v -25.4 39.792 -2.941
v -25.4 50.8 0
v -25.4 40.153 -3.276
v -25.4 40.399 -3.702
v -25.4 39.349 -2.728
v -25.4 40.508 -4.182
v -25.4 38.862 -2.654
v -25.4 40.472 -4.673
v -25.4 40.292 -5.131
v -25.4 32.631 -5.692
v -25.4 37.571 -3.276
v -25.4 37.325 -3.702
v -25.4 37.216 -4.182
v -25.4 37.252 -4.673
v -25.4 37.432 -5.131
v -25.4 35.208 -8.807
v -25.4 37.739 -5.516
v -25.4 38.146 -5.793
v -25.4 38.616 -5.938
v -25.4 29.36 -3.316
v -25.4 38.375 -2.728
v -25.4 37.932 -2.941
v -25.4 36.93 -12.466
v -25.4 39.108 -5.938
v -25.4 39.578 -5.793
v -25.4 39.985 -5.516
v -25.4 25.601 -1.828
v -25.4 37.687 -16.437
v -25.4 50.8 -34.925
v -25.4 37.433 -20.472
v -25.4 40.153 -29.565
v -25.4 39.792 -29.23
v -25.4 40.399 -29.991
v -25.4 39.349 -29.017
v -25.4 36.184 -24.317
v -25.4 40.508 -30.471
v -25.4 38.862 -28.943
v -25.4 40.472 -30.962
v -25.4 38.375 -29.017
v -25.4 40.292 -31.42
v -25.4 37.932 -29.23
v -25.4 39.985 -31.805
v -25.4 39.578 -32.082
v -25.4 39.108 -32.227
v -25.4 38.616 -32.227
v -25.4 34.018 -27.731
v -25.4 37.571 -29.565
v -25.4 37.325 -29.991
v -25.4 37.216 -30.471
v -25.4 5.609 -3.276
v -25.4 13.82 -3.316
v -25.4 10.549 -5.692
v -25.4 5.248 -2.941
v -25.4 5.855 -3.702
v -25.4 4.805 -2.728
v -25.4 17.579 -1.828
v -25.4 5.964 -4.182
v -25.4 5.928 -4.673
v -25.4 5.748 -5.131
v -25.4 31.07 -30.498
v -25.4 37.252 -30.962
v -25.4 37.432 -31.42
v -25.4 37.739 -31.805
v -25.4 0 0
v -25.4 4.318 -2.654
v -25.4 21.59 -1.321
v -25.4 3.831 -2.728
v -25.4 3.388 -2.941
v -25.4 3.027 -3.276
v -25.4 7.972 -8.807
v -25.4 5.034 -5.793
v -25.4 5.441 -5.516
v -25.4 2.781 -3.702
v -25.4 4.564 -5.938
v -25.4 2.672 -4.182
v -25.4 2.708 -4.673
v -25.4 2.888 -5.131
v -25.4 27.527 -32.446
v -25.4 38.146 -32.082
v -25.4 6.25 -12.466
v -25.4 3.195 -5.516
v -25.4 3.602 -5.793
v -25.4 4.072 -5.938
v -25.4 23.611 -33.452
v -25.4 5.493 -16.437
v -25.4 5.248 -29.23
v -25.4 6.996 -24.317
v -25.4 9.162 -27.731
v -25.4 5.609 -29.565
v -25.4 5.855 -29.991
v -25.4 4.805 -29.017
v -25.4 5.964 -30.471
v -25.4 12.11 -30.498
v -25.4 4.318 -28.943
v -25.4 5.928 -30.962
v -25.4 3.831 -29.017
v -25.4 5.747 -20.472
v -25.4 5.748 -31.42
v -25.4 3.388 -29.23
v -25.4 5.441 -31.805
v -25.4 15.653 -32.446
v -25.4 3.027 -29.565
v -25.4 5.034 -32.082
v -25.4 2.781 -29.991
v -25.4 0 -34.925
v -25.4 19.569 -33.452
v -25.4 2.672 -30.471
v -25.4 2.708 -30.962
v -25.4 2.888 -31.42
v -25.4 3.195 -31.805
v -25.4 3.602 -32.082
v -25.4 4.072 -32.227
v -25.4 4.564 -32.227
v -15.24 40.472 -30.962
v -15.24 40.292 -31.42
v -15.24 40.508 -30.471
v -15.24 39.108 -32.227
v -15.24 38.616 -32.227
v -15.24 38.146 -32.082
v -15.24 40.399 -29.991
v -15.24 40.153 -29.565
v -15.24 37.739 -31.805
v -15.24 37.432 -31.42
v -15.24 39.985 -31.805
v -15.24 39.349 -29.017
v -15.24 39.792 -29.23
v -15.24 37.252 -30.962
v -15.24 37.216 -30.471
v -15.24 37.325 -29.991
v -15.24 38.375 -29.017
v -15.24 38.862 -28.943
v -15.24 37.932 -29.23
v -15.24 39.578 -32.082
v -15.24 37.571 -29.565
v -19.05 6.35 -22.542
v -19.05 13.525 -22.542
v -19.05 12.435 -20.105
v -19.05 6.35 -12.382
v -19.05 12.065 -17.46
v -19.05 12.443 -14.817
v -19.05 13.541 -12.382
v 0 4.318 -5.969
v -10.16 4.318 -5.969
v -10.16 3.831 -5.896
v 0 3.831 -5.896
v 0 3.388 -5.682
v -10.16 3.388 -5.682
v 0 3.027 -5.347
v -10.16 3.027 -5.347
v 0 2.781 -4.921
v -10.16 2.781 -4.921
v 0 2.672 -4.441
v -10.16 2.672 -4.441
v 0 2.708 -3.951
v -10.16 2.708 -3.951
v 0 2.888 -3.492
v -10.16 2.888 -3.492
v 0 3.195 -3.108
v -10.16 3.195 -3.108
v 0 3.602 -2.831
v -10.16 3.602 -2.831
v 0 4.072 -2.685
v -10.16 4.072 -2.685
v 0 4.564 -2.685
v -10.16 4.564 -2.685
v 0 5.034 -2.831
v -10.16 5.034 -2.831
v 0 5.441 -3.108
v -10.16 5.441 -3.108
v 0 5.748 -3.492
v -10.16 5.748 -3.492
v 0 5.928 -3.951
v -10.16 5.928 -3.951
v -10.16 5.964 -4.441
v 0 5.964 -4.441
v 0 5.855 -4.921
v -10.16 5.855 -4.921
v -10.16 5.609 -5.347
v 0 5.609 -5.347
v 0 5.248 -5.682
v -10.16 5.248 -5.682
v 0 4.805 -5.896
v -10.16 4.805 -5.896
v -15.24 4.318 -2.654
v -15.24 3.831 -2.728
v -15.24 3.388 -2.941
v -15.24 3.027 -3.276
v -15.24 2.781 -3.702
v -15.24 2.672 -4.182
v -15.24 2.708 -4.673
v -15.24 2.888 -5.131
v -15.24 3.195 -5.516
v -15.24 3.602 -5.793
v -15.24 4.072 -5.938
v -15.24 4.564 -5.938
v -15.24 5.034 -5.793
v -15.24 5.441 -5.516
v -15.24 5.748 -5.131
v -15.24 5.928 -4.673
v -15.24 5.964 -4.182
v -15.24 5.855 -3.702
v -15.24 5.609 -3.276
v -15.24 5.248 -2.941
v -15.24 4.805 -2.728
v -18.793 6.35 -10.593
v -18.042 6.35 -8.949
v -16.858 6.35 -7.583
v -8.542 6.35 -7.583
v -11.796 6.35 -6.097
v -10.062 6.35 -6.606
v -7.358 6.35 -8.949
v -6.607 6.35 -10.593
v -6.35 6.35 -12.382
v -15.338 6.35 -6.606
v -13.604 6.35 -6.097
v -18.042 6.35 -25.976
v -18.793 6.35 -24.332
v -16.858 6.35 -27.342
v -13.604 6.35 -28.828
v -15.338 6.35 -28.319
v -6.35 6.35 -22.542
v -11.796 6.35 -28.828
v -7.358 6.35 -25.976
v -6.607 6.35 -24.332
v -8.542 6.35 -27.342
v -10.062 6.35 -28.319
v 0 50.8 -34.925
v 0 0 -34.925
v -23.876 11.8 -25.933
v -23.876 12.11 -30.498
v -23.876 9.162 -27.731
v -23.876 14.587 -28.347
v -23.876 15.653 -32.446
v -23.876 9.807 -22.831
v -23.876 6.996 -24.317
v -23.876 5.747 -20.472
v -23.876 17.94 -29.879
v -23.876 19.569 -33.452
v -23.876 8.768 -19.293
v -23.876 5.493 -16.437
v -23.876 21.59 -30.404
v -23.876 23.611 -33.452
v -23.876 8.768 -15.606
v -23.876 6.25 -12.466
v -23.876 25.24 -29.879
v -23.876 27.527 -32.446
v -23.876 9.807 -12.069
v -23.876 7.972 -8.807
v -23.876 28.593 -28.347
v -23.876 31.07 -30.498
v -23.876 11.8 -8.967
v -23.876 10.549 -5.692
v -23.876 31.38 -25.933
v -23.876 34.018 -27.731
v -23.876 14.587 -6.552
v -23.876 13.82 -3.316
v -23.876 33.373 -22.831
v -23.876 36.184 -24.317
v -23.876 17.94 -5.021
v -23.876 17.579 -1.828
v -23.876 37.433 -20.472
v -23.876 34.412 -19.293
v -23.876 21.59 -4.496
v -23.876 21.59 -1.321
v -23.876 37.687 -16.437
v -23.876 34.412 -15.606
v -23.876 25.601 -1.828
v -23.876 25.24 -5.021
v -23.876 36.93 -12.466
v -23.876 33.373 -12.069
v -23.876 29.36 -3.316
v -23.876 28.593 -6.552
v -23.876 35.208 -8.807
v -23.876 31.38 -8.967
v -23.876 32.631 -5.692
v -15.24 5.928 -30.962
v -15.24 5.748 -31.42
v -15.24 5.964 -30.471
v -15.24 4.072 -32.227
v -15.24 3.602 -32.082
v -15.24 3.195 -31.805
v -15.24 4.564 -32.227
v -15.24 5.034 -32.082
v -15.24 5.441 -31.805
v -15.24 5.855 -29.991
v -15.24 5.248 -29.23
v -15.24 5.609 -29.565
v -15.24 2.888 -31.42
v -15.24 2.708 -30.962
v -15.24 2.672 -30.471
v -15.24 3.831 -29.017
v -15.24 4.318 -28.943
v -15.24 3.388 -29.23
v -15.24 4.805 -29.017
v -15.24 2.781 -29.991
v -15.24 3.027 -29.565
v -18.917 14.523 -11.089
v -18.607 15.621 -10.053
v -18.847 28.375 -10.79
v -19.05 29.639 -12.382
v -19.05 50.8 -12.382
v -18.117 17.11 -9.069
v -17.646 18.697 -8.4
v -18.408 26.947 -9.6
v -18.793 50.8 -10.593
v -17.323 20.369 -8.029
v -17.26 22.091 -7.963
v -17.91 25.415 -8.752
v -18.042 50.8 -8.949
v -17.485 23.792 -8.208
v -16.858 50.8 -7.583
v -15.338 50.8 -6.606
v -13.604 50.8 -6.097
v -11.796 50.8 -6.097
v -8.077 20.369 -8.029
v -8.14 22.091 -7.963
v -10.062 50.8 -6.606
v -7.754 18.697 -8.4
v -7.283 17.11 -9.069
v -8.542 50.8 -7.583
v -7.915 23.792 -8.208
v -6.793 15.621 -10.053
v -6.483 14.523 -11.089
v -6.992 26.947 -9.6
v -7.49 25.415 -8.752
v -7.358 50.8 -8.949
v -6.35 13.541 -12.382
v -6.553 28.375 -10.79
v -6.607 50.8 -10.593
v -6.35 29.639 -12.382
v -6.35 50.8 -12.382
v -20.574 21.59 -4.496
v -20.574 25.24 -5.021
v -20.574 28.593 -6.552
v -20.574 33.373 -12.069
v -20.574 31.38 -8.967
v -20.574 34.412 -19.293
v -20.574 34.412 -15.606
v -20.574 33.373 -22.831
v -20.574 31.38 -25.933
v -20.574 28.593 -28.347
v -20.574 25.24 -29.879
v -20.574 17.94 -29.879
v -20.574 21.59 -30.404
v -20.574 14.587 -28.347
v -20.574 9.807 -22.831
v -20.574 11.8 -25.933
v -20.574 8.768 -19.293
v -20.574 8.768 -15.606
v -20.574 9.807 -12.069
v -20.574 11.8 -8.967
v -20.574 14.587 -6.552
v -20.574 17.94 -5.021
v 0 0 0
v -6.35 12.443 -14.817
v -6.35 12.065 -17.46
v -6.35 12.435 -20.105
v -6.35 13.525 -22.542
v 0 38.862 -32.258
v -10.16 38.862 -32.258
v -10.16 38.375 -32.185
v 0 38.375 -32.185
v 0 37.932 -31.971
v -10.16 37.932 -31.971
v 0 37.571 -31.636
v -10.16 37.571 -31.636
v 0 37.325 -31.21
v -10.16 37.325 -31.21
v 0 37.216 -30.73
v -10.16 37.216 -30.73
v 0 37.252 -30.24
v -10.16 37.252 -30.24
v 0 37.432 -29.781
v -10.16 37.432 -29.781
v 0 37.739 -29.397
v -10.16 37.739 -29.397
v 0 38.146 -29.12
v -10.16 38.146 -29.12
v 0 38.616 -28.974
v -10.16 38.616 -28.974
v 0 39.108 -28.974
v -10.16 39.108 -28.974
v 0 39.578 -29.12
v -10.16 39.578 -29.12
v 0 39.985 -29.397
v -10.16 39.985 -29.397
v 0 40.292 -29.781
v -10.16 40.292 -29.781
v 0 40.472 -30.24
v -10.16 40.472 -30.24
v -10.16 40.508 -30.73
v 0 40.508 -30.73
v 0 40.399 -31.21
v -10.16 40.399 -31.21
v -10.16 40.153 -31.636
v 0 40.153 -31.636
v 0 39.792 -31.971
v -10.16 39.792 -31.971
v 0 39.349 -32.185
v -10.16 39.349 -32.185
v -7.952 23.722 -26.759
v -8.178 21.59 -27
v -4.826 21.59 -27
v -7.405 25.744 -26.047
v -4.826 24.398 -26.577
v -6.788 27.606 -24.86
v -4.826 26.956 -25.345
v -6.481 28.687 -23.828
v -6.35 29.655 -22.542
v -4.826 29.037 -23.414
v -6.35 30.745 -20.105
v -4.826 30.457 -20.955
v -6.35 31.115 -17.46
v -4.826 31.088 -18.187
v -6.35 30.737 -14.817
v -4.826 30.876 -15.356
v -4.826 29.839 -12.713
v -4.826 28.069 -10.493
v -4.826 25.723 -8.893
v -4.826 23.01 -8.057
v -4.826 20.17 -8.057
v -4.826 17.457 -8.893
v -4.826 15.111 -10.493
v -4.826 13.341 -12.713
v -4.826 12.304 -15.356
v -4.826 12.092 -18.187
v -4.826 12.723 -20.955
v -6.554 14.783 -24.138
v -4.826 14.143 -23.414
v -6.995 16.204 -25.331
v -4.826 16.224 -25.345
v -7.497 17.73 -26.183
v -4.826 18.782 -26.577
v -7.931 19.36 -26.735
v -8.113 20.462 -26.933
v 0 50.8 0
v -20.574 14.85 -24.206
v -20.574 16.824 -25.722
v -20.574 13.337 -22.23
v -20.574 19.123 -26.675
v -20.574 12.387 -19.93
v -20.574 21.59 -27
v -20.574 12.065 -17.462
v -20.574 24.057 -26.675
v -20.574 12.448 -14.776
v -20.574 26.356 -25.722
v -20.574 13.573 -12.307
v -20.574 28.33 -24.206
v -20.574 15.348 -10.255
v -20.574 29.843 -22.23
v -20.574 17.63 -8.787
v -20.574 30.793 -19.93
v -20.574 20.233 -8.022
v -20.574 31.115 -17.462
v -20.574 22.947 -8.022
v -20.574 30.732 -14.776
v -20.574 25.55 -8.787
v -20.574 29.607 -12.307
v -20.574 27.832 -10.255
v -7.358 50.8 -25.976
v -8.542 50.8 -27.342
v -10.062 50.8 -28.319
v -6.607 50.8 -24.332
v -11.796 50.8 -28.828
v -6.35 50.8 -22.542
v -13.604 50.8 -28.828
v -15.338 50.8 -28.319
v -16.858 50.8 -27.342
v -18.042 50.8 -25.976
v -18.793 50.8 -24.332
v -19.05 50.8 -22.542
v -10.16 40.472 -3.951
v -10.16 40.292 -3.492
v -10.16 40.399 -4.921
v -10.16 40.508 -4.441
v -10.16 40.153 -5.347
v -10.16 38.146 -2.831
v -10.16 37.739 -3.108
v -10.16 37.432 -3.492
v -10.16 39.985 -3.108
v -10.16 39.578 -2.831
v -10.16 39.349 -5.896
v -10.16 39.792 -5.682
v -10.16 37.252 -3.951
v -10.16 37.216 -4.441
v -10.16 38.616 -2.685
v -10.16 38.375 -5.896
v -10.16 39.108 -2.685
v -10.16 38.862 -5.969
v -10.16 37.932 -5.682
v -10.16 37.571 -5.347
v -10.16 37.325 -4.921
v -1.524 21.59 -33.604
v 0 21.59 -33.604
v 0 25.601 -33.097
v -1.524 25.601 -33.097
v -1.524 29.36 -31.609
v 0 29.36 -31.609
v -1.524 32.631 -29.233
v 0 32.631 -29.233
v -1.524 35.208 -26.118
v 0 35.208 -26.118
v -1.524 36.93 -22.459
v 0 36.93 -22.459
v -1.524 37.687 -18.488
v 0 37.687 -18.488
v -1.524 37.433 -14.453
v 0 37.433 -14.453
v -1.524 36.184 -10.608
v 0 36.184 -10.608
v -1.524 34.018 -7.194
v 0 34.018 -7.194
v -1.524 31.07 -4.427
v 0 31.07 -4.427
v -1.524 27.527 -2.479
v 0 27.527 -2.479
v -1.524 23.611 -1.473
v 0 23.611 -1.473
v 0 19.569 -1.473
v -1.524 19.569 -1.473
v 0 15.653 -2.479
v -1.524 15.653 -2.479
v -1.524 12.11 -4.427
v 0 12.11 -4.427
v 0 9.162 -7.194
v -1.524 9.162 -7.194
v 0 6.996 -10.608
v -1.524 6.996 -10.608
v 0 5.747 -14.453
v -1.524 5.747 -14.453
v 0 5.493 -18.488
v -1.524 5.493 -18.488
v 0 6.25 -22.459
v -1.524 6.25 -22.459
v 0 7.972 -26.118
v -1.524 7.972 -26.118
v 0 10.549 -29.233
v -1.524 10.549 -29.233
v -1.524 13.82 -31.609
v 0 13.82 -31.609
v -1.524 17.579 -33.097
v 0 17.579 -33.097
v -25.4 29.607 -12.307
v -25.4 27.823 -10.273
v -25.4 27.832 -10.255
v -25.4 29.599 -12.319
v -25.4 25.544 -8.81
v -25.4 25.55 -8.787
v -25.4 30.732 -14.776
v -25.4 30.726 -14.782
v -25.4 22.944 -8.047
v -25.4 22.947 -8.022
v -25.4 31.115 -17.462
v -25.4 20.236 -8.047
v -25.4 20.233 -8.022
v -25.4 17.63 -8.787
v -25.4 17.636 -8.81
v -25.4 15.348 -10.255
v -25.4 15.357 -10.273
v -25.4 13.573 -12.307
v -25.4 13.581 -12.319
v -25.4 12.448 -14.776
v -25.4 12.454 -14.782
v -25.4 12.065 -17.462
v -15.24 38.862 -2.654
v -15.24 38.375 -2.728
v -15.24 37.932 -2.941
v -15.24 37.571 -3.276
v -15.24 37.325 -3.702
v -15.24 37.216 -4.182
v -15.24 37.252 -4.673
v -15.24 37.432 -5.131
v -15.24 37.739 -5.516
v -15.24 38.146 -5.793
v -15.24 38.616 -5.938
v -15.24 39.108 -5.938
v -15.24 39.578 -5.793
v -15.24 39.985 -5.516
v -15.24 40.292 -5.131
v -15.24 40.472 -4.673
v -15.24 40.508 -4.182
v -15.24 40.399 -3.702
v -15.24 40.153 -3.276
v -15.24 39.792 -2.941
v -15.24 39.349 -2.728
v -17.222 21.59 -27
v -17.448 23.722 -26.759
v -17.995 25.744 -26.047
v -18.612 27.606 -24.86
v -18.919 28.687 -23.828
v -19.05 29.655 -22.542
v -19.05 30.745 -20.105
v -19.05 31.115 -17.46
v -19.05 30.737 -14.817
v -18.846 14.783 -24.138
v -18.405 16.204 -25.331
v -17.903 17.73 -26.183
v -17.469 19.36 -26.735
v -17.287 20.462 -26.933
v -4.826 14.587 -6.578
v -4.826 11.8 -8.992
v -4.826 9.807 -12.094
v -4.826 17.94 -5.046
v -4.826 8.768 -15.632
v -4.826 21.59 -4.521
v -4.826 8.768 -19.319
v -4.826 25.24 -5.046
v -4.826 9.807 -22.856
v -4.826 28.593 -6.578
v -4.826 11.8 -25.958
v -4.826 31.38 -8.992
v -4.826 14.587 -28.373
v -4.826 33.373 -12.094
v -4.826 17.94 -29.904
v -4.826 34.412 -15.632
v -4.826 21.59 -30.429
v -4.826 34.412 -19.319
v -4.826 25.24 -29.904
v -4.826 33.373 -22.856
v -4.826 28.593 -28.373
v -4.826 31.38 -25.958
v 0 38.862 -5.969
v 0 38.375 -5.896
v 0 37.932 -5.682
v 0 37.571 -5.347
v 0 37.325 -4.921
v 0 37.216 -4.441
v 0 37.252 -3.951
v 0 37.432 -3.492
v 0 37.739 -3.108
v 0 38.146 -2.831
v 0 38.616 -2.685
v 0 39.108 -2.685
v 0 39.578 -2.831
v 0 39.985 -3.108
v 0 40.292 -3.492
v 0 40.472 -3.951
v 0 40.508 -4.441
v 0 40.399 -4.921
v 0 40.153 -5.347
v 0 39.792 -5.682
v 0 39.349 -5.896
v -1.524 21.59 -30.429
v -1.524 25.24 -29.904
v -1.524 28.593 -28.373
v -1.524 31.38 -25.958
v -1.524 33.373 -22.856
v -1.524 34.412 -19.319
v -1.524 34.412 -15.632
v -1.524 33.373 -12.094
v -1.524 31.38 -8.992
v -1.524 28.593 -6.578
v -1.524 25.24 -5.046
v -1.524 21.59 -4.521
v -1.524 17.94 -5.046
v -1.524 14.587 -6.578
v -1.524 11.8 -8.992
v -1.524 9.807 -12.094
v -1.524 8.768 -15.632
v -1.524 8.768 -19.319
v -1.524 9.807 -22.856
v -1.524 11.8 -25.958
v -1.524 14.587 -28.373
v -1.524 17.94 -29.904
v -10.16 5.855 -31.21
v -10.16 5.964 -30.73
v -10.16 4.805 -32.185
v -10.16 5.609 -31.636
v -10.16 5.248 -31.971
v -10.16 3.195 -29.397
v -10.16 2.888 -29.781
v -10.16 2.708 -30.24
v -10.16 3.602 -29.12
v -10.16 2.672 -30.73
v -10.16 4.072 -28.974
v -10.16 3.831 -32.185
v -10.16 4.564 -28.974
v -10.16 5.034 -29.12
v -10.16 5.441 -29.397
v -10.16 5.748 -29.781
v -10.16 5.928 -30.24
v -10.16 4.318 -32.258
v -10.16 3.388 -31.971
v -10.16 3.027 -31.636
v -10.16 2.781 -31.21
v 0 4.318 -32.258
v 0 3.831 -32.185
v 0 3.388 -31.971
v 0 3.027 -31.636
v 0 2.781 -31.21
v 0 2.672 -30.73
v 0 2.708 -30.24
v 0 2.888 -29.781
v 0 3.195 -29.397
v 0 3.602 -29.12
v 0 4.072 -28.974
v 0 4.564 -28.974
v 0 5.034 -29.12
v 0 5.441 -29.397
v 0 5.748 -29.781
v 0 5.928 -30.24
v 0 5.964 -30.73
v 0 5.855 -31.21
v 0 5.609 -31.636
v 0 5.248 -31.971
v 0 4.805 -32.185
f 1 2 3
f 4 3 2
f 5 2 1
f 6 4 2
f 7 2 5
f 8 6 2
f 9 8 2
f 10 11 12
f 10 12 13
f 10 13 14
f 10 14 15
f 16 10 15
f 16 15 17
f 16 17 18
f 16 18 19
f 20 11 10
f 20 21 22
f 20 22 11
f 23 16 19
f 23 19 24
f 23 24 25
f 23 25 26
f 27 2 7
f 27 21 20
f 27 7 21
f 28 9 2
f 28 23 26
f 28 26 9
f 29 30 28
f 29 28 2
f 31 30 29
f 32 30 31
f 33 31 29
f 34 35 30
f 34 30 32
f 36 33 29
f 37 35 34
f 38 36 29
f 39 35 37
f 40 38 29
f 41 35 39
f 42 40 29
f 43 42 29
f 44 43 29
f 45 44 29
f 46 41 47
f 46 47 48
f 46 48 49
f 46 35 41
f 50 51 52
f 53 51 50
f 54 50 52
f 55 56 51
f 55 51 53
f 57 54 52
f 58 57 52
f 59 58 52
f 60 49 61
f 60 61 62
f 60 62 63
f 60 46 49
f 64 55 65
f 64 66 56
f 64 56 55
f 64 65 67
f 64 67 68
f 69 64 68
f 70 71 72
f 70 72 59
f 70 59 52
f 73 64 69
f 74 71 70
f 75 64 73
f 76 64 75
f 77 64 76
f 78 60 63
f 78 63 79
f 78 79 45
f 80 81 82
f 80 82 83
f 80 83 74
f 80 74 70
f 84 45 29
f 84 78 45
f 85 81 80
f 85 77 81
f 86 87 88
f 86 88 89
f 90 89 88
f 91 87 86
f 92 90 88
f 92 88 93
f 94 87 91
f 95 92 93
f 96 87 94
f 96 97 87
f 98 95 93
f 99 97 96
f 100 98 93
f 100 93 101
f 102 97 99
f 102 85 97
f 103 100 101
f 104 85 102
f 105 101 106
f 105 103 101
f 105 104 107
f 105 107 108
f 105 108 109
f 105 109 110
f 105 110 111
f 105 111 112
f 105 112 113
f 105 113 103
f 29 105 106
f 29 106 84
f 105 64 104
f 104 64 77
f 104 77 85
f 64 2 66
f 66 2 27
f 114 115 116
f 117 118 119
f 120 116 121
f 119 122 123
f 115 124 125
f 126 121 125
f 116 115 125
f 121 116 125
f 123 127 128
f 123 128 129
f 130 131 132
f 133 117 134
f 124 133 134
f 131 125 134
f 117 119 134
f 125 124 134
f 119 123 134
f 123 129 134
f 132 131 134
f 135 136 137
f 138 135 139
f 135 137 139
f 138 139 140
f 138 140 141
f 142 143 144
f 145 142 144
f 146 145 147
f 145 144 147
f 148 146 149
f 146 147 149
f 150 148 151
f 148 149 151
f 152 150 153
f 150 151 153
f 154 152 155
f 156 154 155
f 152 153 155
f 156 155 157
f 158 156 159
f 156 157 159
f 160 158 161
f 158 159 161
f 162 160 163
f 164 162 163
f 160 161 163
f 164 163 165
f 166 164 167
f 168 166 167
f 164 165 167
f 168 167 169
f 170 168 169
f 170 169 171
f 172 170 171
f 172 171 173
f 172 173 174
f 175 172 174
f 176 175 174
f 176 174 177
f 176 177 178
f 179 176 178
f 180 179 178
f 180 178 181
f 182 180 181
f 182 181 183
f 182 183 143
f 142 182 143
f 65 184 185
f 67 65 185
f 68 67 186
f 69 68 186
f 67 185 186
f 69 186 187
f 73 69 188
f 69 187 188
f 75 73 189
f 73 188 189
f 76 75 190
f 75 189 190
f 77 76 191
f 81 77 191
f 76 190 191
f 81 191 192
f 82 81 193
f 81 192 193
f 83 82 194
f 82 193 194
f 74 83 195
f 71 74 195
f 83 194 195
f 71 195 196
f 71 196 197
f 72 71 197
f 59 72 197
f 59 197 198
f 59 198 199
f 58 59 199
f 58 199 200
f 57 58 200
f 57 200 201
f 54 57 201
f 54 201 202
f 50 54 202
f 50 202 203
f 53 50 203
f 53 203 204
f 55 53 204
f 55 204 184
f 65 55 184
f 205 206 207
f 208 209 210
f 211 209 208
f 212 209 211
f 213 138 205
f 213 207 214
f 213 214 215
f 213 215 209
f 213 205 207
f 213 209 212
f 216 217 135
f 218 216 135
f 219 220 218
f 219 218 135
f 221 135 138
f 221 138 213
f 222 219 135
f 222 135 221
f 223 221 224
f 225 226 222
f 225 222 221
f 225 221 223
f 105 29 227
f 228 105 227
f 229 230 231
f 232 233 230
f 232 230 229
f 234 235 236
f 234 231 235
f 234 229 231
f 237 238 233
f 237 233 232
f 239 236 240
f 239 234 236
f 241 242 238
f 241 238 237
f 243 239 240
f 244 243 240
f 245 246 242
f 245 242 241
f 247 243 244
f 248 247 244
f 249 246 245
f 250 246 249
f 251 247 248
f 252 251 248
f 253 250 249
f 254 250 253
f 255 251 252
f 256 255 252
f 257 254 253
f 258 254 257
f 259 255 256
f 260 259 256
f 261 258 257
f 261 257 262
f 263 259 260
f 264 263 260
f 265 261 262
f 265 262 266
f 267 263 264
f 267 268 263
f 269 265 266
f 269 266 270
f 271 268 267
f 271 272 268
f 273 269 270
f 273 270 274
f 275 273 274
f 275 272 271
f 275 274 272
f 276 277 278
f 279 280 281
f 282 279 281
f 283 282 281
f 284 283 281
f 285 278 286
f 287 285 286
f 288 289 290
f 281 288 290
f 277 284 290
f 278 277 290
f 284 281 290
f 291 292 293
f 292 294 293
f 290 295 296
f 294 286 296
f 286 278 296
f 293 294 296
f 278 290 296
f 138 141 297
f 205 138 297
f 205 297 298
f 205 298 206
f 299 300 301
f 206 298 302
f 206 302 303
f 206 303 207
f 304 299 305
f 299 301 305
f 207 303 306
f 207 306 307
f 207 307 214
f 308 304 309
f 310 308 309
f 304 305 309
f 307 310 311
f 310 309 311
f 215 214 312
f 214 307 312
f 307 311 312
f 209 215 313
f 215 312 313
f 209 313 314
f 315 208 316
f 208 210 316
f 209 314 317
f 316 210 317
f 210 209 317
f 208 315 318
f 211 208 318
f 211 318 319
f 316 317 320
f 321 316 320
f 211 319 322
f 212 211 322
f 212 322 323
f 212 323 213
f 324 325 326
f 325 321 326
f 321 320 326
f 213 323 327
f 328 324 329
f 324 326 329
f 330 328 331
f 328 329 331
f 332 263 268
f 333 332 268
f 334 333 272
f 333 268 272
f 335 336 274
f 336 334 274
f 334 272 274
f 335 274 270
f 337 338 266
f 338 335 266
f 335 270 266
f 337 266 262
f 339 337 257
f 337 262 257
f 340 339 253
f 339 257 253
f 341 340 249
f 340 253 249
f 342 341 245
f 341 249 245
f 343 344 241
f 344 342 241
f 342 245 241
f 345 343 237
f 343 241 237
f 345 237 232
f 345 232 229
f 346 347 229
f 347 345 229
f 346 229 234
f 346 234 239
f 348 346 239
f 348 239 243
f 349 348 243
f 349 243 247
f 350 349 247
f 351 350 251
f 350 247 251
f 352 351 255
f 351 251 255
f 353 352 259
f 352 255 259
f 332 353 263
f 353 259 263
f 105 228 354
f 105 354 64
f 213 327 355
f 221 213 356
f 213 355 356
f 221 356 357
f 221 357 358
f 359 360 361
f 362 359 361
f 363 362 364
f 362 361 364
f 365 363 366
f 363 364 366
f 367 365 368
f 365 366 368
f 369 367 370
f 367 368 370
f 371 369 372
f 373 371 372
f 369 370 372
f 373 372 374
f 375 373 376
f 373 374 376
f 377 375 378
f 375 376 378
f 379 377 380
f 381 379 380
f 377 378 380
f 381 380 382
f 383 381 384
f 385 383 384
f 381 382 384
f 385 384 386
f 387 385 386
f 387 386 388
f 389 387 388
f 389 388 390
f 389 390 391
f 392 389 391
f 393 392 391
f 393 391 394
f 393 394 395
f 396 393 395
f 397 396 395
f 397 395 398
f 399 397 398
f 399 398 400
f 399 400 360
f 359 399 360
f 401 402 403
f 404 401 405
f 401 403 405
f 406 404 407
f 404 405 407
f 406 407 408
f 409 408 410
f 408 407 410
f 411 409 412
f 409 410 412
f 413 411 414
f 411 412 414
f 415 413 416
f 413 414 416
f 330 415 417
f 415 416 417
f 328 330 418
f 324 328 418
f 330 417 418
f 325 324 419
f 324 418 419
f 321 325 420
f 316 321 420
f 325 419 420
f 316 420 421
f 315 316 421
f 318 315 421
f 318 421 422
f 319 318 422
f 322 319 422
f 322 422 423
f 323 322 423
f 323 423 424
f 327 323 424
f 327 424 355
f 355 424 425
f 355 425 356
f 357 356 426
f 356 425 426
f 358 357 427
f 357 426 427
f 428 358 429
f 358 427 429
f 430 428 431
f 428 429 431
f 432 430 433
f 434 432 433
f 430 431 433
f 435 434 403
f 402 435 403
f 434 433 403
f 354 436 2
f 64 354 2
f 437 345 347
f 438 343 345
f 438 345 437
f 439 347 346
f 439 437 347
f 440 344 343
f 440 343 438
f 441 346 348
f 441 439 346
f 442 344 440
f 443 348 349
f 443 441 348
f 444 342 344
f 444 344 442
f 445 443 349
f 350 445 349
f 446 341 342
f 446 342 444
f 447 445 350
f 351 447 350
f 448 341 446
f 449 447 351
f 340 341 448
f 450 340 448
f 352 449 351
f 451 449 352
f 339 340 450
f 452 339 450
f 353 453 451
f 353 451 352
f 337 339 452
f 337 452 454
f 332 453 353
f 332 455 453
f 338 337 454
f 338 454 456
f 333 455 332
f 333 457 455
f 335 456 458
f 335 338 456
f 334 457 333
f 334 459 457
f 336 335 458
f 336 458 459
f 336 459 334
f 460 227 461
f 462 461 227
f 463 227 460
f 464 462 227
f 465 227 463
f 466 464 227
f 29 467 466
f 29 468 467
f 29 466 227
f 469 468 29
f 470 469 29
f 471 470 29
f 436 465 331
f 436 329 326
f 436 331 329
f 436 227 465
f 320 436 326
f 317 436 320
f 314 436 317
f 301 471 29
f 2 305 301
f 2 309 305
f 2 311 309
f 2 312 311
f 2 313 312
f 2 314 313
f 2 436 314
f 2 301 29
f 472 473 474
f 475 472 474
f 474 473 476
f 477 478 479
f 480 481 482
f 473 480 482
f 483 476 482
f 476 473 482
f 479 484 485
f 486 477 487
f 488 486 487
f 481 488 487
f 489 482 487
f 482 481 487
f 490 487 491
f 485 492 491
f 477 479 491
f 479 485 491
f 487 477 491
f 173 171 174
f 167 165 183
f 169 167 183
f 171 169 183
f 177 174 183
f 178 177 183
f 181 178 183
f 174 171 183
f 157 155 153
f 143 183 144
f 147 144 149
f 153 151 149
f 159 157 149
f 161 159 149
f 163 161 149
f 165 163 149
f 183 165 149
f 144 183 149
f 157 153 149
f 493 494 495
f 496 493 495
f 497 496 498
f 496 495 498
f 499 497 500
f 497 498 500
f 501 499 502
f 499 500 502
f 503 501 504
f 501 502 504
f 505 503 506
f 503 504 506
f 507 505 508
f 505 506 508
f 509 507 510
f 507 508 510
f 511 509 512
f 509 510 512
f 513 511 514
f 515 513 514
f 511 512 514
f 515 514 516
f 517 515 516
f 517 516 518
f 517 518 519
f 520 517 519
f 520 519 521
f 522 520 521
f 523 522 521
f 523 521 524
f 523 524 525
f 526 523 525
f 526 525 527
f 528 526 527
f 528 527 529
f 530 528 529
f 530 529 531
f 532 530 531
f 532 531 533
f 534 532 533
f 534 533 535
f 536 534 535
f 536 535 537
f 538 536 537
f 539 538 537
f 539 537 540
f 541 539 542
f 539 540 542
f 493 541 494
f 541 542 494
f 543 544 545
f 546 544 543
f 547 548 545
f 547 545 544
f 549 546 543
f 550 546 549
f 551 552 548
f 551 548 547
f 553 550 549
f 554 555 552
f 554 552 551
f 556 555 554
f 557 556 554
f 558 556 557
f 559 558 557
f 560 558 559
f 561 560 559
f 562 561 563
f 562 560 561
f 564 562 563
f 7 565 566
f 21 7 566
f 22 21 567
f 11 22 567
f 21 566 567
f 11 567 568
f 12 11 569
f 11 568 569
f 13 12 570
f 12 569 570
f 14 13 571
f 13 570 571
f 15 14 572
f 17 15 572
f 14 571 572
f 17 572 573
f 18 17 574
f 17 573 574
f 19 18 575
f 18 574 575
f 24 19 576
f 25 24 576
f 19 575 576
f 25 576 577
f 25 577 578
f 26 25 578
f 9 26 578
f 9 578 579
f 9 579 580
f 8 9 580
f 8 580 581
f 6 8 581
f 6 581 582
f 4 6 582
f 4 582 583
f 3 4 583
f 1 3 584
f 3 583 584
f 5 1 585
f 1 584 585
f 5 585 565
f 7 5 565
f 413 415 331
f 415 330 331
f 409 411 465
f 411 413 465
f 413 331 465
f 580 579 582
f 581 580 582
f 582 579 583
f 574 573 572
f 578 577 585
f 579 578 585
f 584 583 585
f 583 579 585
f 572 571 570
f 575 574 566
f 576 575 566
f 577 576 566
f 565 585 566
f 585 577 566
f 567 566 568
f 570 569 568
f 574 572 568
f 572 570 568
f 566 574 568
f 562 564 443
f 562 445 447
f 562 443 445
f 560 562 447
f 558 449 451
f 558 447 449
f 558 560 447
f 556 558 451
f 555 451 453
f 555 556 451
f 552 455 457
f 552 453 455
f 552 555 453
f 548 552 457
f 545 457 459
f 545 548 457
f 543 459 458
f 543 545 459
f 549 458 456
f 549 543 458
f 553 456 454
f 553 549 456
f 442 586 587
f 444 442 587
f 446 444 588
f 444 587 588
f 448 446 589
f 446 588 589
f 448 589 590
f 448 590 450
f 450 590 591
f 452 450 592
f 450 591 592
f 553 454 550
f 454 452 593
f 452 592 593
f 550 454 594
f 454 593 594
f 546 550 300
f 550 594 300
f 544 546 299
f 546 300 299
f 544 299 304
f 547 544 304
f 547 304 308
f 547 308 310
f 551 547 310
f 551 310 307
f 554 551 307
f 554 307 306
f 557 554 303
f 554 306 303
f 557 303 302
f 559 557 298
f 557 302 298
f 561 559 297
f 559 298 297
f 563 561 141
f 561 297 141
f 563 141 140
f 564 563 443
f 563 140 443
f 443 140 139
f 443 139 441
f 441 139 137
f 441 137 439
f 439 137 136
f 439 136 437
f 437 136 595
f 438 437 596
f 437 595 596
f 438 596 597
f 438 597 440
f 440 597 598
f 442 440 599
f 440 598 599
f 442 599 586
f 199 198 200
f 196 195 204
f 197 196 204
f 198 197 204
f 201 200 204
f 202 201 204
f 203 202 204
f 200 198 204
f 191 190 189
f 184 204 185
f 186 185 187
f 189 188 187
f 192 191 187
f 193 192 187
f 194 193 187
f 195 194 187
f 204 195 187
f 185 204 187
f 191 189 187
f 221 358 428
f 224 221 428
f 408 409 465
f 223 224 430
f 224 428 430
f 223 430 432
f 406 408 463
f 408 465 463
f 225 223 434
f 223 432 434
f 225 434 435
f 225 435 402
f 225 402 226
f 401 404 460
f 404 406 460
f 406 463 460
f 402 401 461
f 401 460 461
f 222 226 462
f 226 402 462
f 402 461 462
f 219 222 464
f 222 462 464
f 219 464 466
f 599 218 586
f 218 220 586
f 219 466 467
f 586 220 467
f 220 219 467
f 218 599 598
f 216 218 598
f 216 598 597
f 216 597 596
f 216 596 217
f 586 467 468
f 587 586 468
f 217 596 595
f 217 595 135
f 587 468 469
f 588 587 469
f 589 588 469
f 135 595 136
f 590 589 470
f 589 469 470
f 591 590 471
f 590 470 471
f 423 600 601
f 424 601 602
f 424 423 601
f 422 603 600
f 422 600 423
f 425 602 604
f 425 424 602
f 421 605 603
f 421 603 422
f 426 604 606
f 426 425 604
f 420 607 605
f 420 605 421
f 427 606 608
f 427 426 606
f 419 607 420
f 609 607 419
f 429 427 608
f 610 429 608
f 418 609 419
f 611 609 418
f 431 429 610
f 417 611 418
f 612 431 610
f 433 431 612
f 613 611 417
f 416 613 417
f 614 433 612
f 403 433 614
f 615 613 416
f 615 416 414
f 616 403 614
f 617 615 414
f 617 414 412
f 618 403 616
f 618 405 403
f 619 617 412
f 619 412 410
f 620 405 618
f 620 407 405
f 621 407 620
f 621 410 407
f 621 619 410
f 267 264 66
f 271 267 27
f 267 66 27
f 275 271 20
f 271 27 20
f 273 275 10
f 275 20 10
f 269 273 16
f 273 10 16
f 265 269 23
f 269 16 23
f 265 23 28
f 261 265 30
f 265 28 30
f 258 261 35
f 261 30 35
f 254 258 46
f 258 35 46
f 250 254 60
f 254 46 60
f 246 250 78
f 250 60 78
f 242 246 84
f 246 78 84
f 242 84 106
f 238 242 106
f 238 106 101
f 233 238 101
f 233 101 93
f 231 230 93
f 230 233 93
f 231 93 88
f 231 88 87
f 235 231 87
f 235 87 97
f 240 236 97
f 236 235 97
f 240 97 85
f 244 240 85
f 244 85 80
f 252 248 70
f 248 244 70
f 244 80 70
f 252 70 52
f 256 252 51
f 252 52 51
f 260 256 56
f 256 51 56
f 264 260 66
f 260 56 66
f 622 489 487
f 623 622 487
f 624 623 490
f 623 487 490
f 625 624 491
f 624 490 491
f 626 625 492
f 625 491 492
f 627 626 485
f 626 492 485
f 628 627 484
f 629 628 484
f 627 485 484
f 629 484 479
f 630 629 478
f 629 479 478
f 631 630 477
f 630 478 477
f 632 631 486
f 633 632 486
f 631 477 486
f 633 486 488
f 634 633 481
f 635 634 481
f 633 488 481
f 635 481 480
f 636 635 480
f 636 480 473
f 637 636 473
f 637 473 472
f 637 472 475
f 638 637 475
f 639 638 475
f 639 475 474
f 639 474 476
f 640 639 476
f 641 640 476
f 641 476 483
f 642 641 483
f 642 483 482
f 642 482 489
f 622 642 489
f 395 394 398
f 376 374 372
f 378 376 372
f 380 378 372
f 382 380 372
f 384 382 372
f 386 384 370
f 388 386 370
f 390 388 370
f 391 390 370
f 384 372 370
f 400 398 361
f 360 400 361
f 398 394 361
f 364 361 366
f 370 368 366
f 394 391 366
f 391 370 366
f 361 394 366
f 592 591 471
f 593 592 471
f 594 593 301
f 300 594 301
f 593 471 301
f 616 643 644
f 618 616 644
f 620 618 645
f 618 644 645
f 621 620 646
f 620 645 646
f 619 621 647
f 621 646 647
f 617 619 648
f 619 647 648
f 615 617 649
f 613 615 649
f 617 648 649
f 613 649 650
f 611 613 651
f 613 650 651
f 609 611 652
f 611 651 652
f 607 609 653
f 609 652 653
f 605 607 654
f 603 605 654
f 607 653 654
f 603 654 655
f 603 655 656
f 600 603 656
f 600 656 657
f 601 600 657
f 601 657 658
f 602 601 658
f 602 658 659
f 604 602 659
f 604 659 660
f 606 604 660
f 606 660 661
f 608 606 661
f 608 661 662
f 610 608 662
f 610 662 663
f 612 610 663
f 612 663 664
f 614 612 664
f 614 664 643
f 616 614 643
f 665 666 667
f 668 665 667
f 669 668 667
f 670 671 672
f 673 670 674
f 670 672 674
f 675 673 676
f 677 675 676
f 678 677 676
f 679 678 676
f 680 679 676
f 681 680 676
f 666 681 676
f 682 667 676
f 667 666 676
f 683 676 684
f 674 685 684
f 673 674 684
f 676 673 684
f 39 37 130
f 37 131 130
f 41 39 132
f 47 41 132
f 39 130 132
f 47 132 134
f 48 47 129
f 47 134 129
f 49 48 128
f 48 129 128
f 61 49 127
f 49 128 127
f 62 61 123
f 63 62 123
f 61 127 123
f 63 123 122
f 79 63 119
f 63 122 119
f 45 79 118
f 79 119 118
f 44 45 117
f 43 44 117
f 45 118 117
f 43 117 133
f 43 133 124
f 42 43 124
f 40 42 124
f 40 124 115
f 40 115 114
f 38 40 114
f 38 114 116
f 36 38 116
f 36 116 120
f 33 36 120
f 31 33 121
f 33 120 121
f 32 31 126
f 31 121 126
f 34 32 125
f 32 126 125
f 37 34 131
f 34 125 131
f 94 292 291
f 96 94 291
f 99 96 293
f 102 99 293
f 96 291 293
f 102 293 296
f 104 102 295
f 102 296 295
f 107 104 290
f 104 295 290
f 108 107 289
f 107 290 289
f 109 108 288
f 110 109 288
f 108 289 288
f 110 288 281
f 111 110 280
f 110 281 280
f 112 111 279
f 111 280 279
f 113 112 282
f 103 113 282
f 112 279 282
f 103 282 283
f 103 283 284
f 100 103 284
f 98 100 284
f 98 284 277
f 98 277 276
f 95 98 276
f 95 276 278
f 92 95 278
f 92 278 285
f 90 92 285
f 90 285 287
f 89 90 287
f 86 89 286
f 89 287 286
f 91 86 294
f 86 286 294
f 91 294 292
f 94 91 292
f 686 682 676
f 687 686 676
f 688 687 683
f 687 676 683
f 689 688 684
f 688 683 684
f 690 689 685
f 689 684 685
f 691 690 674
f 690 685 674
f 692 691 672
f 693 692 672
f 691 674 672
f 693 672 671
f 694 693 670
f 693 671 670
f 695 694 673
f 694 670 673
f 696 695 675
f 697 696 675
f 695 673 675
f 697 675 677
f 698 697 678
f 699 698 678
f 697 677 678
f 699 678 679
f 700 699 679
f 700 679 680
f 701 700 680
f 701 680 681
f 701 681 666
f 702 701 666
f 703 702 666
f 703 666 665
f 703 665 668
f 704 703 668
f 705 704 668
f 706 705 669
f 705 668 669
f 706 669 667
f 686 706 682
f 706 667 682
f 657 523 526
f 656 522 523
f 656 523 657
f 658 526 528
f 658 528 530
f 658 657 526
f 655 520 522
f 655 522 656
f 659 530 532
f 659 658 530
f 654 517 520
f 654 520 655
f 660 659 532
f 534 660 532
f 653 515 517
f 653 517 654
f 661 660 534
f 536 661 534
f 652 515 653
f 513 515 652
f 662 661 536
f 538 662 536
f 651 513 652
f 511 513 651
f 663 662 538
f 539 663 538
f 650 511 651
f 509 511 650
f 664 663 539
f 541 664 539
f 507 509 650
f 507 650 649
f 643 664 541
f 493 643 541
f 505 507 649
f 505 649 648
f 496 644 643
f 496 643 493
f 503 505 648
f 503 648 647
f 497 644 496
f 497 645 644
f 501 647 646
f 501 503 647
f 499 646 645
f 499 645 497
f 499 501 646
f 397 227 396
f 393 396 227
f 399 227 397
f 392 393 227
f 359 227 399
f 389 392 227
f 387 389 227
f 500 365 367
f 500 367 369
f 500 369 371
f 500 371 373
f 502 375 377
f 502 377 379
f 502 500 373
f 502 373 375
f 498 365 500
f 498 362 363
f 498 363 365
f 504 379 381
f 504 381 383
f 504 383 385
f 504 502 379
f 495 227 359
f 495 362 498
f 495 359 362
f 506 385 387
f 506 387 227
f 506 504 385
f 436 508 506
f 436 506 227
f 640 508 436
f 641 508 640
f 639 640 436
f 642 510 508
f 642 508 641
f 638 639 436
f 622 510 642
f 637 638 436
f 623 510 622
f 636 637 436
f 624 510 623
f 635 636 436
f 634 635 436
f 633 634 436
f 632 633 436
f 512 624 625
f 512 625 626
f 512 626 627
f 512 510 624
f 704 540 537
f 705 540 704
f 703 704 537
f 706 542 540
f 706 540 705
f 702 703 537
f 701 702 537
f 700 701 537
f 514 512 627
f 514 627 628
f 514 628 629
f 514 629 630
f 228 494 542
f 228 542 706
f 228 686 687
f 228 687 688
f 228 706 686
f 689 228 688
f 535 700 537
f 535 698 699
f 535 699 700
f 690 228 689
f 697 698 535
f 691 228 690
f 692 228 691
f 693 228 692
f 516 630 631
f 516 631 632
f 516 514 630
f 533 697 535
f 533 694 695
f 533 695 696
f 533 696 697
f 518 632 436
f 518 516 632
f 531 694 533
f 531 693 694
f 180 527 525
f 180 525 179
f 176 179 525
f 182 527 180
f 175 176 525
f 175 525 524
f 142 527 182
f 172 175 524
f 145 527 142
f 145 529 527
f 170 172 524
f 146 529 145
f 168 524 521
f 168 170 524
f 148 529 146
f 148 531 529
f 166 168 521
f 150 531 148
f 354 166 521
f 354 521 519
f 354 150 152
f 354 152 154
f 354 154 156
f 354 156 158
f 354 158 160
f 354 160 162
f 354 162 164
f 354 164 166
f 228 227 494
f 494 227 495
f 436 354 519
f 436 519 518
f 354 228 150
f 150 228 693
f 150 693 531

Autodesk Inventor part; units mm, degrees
ref_plane "YZ Plane" through (0, 0, 0) normal (1, 0, 0) x (0, 1, 0)
ref_plane "XZ Plane" through (0, 0, 0) normal (0, 1, 0) x (-1, 0, 0)
ref_plane "XY Plane" through (0, 0, 0) normal (0, 0, 1) x (1, 0, 0)
sketch "Sketch1" plane through (0, 0, 0) normal (0, 1, 0) x (-1, 0, 0)
  line L0 (0, 0) -> (25.4, 0)
  line L1 (25.4, 0) -> (25.4, -34.925)
  line L2 (25.4, -34.925) -> (0, -34.925)
  line L3 (0, -34.925) -> (0, 0)
  dimension "BlockW" = 25.4
  dimension "BlockL" = 34.925
extrude "Extrusion1" add sketch "Sketch1" along normal blind 50.8
sketch "Sketch2" plane through (0, 50.8, 0) normal (0, 1, 0) x (1, 0, 0)
  line L0 (0, 0) -> (-12.7, 0)
  line L1 (0, 17.4625) -> (0, 0)
  line L2 (-12.7, 22.5425) -> (-12.7, 12.3825) construction
  line L3 (-19.05, 22.5425) -> (-19.05, 12.3825)
  line L4 (-6.35, 12.3825) -> (-6.35, 22.5425)
  arc A0 (-6.35, 22.5425) -> (-19.05, 22.5425) centre (-12.7, 22.5425) ccw
  arc A1 (-19.05, 12.3825) -> (-6.35, 12.3825) centre (-12.7, 12.3825) ccw
  line L5 (-12.7, 17.4625) -> (-2.54, 17.4625) construction
  dimension "d4" = 12.7
  dimension "d5" = 17.4625
  dimension "d33" = 5.08
  dimension "d35" = 12.7
extrude "Extrusion7" cut sketch "Sketch2" against normal blind 44.45
sketch "Sketch3" plane through (0, 0, 0) normal (1, 0, 0) x (0, 0, -1)
  line L0 (0, 0) -> (17.4752, 0)
  line L1 (0, 21.59) -> (0, 0)
  circle A0 centre (17.4752, 21.59) radius 9.525
  circle A1 centre (17.4752, 21.59) radius 12.954
  circle A2 centre (17.4752, 21.59) radius 16.129
  line L2 (4.318, 21.59) -> (21.59, 21.59) construction
  point P0 (4.318, 38.862)
  dimension "d15" = 19.05
  dimension "d16" = 25.908
  dimension "d17" = 32.258
hole "Hole2" at (0, 38.862, -4.318) direction (-1, 0, 0) diameter 3.302 depth 10.16 thread size "8-32 UNC" class "2B" standard "ANSI Unified Screw Threads"
pattern_linear "Rectangular Pattern1" count 2 spacing 26.289 along (0, 0, -1) count 2 spacing 34.544 along (0, -1, 0) of "Hole2"
extrude "Extrusion2" cut sketch "Sketch3" against normal through all contours A0
extrude "Extrusion3" cut sketch "Sketch3" against normal blind 4.826 contours A1
extrude "Extrusion4" cut sketch "Sketch3" against normal blind 1.524 contours A2
sketch "Sketch4" plane through (-25.4, 0, -34.925) normal (-1, 0, 0) x (0, 0, 1)
  line L0 (0, 0) -> (17.4752, 0)
  line L1 (17.4752, 21.59) -> (0, 21.59)
  line L2 (0, 21.59) -> (0, 0)
  circle A0 centre (17.4752, 21.59) radius 9.525
  circle A1 centre (17.4752, 21.59) radius 12.954
  circle A2 centre (17.4752, 21.59) radius 16.129
  line L3 (17.4752, 21.59) -> (30.6197, 21.59)
  line L4 (30.6197, 21.59) -> (30.6197, 38.862)
  line L5 (30.6197, 38.862) -> (17.4752, 38.862)
  line L6 (17.4752, 38.862) -> (17.4752, 21.59)
  point P0 (34.925, 0)
  dimension "d24" = 17.4752
  dimension "d25" = 21.59
  dimension "d26" = 19.05
  dimension "d28" = 32.258
  dimension "d57" = 13.1445
  dimension "d58" = 17.272
extrude "Extrusion5" cut sketch "Sketch4" against normal blind 4.826 contours A0 L3 A1 L1 | L1 A1 L6 A0 | A0 L6 A1 L3
extrude "Extrusion6" cut sketch "Sketch4" against normal blind 1.524 contours A1 L3 L4 A2 L1 | L1 A2 L6 A1 | A1 L6 A2 L4 L3
hole "Hole3" at (-25.4, 38.862, -4.3053) direction (1, 0, 0) diameter 3.302 depth 10.16 thread size "8-32 UNC" class "2B" standard "ANSI Unified Screw Threads"
pattern_linear "Rectangular Pattern2" count 2 spacing 26.289 along (0, 0, -1) count 2 spacing 34.544 along (0, -1, 0) of "Hole3"
equation "\"d4\" = 0.5 * BlockW"
equation "\"d5\" = 0.5 * BlockL"
equation "\"d36\" = WellDepth"
equation "\"WellDepth\" = 44.45"
properties part number "VaporFlowBlock"
